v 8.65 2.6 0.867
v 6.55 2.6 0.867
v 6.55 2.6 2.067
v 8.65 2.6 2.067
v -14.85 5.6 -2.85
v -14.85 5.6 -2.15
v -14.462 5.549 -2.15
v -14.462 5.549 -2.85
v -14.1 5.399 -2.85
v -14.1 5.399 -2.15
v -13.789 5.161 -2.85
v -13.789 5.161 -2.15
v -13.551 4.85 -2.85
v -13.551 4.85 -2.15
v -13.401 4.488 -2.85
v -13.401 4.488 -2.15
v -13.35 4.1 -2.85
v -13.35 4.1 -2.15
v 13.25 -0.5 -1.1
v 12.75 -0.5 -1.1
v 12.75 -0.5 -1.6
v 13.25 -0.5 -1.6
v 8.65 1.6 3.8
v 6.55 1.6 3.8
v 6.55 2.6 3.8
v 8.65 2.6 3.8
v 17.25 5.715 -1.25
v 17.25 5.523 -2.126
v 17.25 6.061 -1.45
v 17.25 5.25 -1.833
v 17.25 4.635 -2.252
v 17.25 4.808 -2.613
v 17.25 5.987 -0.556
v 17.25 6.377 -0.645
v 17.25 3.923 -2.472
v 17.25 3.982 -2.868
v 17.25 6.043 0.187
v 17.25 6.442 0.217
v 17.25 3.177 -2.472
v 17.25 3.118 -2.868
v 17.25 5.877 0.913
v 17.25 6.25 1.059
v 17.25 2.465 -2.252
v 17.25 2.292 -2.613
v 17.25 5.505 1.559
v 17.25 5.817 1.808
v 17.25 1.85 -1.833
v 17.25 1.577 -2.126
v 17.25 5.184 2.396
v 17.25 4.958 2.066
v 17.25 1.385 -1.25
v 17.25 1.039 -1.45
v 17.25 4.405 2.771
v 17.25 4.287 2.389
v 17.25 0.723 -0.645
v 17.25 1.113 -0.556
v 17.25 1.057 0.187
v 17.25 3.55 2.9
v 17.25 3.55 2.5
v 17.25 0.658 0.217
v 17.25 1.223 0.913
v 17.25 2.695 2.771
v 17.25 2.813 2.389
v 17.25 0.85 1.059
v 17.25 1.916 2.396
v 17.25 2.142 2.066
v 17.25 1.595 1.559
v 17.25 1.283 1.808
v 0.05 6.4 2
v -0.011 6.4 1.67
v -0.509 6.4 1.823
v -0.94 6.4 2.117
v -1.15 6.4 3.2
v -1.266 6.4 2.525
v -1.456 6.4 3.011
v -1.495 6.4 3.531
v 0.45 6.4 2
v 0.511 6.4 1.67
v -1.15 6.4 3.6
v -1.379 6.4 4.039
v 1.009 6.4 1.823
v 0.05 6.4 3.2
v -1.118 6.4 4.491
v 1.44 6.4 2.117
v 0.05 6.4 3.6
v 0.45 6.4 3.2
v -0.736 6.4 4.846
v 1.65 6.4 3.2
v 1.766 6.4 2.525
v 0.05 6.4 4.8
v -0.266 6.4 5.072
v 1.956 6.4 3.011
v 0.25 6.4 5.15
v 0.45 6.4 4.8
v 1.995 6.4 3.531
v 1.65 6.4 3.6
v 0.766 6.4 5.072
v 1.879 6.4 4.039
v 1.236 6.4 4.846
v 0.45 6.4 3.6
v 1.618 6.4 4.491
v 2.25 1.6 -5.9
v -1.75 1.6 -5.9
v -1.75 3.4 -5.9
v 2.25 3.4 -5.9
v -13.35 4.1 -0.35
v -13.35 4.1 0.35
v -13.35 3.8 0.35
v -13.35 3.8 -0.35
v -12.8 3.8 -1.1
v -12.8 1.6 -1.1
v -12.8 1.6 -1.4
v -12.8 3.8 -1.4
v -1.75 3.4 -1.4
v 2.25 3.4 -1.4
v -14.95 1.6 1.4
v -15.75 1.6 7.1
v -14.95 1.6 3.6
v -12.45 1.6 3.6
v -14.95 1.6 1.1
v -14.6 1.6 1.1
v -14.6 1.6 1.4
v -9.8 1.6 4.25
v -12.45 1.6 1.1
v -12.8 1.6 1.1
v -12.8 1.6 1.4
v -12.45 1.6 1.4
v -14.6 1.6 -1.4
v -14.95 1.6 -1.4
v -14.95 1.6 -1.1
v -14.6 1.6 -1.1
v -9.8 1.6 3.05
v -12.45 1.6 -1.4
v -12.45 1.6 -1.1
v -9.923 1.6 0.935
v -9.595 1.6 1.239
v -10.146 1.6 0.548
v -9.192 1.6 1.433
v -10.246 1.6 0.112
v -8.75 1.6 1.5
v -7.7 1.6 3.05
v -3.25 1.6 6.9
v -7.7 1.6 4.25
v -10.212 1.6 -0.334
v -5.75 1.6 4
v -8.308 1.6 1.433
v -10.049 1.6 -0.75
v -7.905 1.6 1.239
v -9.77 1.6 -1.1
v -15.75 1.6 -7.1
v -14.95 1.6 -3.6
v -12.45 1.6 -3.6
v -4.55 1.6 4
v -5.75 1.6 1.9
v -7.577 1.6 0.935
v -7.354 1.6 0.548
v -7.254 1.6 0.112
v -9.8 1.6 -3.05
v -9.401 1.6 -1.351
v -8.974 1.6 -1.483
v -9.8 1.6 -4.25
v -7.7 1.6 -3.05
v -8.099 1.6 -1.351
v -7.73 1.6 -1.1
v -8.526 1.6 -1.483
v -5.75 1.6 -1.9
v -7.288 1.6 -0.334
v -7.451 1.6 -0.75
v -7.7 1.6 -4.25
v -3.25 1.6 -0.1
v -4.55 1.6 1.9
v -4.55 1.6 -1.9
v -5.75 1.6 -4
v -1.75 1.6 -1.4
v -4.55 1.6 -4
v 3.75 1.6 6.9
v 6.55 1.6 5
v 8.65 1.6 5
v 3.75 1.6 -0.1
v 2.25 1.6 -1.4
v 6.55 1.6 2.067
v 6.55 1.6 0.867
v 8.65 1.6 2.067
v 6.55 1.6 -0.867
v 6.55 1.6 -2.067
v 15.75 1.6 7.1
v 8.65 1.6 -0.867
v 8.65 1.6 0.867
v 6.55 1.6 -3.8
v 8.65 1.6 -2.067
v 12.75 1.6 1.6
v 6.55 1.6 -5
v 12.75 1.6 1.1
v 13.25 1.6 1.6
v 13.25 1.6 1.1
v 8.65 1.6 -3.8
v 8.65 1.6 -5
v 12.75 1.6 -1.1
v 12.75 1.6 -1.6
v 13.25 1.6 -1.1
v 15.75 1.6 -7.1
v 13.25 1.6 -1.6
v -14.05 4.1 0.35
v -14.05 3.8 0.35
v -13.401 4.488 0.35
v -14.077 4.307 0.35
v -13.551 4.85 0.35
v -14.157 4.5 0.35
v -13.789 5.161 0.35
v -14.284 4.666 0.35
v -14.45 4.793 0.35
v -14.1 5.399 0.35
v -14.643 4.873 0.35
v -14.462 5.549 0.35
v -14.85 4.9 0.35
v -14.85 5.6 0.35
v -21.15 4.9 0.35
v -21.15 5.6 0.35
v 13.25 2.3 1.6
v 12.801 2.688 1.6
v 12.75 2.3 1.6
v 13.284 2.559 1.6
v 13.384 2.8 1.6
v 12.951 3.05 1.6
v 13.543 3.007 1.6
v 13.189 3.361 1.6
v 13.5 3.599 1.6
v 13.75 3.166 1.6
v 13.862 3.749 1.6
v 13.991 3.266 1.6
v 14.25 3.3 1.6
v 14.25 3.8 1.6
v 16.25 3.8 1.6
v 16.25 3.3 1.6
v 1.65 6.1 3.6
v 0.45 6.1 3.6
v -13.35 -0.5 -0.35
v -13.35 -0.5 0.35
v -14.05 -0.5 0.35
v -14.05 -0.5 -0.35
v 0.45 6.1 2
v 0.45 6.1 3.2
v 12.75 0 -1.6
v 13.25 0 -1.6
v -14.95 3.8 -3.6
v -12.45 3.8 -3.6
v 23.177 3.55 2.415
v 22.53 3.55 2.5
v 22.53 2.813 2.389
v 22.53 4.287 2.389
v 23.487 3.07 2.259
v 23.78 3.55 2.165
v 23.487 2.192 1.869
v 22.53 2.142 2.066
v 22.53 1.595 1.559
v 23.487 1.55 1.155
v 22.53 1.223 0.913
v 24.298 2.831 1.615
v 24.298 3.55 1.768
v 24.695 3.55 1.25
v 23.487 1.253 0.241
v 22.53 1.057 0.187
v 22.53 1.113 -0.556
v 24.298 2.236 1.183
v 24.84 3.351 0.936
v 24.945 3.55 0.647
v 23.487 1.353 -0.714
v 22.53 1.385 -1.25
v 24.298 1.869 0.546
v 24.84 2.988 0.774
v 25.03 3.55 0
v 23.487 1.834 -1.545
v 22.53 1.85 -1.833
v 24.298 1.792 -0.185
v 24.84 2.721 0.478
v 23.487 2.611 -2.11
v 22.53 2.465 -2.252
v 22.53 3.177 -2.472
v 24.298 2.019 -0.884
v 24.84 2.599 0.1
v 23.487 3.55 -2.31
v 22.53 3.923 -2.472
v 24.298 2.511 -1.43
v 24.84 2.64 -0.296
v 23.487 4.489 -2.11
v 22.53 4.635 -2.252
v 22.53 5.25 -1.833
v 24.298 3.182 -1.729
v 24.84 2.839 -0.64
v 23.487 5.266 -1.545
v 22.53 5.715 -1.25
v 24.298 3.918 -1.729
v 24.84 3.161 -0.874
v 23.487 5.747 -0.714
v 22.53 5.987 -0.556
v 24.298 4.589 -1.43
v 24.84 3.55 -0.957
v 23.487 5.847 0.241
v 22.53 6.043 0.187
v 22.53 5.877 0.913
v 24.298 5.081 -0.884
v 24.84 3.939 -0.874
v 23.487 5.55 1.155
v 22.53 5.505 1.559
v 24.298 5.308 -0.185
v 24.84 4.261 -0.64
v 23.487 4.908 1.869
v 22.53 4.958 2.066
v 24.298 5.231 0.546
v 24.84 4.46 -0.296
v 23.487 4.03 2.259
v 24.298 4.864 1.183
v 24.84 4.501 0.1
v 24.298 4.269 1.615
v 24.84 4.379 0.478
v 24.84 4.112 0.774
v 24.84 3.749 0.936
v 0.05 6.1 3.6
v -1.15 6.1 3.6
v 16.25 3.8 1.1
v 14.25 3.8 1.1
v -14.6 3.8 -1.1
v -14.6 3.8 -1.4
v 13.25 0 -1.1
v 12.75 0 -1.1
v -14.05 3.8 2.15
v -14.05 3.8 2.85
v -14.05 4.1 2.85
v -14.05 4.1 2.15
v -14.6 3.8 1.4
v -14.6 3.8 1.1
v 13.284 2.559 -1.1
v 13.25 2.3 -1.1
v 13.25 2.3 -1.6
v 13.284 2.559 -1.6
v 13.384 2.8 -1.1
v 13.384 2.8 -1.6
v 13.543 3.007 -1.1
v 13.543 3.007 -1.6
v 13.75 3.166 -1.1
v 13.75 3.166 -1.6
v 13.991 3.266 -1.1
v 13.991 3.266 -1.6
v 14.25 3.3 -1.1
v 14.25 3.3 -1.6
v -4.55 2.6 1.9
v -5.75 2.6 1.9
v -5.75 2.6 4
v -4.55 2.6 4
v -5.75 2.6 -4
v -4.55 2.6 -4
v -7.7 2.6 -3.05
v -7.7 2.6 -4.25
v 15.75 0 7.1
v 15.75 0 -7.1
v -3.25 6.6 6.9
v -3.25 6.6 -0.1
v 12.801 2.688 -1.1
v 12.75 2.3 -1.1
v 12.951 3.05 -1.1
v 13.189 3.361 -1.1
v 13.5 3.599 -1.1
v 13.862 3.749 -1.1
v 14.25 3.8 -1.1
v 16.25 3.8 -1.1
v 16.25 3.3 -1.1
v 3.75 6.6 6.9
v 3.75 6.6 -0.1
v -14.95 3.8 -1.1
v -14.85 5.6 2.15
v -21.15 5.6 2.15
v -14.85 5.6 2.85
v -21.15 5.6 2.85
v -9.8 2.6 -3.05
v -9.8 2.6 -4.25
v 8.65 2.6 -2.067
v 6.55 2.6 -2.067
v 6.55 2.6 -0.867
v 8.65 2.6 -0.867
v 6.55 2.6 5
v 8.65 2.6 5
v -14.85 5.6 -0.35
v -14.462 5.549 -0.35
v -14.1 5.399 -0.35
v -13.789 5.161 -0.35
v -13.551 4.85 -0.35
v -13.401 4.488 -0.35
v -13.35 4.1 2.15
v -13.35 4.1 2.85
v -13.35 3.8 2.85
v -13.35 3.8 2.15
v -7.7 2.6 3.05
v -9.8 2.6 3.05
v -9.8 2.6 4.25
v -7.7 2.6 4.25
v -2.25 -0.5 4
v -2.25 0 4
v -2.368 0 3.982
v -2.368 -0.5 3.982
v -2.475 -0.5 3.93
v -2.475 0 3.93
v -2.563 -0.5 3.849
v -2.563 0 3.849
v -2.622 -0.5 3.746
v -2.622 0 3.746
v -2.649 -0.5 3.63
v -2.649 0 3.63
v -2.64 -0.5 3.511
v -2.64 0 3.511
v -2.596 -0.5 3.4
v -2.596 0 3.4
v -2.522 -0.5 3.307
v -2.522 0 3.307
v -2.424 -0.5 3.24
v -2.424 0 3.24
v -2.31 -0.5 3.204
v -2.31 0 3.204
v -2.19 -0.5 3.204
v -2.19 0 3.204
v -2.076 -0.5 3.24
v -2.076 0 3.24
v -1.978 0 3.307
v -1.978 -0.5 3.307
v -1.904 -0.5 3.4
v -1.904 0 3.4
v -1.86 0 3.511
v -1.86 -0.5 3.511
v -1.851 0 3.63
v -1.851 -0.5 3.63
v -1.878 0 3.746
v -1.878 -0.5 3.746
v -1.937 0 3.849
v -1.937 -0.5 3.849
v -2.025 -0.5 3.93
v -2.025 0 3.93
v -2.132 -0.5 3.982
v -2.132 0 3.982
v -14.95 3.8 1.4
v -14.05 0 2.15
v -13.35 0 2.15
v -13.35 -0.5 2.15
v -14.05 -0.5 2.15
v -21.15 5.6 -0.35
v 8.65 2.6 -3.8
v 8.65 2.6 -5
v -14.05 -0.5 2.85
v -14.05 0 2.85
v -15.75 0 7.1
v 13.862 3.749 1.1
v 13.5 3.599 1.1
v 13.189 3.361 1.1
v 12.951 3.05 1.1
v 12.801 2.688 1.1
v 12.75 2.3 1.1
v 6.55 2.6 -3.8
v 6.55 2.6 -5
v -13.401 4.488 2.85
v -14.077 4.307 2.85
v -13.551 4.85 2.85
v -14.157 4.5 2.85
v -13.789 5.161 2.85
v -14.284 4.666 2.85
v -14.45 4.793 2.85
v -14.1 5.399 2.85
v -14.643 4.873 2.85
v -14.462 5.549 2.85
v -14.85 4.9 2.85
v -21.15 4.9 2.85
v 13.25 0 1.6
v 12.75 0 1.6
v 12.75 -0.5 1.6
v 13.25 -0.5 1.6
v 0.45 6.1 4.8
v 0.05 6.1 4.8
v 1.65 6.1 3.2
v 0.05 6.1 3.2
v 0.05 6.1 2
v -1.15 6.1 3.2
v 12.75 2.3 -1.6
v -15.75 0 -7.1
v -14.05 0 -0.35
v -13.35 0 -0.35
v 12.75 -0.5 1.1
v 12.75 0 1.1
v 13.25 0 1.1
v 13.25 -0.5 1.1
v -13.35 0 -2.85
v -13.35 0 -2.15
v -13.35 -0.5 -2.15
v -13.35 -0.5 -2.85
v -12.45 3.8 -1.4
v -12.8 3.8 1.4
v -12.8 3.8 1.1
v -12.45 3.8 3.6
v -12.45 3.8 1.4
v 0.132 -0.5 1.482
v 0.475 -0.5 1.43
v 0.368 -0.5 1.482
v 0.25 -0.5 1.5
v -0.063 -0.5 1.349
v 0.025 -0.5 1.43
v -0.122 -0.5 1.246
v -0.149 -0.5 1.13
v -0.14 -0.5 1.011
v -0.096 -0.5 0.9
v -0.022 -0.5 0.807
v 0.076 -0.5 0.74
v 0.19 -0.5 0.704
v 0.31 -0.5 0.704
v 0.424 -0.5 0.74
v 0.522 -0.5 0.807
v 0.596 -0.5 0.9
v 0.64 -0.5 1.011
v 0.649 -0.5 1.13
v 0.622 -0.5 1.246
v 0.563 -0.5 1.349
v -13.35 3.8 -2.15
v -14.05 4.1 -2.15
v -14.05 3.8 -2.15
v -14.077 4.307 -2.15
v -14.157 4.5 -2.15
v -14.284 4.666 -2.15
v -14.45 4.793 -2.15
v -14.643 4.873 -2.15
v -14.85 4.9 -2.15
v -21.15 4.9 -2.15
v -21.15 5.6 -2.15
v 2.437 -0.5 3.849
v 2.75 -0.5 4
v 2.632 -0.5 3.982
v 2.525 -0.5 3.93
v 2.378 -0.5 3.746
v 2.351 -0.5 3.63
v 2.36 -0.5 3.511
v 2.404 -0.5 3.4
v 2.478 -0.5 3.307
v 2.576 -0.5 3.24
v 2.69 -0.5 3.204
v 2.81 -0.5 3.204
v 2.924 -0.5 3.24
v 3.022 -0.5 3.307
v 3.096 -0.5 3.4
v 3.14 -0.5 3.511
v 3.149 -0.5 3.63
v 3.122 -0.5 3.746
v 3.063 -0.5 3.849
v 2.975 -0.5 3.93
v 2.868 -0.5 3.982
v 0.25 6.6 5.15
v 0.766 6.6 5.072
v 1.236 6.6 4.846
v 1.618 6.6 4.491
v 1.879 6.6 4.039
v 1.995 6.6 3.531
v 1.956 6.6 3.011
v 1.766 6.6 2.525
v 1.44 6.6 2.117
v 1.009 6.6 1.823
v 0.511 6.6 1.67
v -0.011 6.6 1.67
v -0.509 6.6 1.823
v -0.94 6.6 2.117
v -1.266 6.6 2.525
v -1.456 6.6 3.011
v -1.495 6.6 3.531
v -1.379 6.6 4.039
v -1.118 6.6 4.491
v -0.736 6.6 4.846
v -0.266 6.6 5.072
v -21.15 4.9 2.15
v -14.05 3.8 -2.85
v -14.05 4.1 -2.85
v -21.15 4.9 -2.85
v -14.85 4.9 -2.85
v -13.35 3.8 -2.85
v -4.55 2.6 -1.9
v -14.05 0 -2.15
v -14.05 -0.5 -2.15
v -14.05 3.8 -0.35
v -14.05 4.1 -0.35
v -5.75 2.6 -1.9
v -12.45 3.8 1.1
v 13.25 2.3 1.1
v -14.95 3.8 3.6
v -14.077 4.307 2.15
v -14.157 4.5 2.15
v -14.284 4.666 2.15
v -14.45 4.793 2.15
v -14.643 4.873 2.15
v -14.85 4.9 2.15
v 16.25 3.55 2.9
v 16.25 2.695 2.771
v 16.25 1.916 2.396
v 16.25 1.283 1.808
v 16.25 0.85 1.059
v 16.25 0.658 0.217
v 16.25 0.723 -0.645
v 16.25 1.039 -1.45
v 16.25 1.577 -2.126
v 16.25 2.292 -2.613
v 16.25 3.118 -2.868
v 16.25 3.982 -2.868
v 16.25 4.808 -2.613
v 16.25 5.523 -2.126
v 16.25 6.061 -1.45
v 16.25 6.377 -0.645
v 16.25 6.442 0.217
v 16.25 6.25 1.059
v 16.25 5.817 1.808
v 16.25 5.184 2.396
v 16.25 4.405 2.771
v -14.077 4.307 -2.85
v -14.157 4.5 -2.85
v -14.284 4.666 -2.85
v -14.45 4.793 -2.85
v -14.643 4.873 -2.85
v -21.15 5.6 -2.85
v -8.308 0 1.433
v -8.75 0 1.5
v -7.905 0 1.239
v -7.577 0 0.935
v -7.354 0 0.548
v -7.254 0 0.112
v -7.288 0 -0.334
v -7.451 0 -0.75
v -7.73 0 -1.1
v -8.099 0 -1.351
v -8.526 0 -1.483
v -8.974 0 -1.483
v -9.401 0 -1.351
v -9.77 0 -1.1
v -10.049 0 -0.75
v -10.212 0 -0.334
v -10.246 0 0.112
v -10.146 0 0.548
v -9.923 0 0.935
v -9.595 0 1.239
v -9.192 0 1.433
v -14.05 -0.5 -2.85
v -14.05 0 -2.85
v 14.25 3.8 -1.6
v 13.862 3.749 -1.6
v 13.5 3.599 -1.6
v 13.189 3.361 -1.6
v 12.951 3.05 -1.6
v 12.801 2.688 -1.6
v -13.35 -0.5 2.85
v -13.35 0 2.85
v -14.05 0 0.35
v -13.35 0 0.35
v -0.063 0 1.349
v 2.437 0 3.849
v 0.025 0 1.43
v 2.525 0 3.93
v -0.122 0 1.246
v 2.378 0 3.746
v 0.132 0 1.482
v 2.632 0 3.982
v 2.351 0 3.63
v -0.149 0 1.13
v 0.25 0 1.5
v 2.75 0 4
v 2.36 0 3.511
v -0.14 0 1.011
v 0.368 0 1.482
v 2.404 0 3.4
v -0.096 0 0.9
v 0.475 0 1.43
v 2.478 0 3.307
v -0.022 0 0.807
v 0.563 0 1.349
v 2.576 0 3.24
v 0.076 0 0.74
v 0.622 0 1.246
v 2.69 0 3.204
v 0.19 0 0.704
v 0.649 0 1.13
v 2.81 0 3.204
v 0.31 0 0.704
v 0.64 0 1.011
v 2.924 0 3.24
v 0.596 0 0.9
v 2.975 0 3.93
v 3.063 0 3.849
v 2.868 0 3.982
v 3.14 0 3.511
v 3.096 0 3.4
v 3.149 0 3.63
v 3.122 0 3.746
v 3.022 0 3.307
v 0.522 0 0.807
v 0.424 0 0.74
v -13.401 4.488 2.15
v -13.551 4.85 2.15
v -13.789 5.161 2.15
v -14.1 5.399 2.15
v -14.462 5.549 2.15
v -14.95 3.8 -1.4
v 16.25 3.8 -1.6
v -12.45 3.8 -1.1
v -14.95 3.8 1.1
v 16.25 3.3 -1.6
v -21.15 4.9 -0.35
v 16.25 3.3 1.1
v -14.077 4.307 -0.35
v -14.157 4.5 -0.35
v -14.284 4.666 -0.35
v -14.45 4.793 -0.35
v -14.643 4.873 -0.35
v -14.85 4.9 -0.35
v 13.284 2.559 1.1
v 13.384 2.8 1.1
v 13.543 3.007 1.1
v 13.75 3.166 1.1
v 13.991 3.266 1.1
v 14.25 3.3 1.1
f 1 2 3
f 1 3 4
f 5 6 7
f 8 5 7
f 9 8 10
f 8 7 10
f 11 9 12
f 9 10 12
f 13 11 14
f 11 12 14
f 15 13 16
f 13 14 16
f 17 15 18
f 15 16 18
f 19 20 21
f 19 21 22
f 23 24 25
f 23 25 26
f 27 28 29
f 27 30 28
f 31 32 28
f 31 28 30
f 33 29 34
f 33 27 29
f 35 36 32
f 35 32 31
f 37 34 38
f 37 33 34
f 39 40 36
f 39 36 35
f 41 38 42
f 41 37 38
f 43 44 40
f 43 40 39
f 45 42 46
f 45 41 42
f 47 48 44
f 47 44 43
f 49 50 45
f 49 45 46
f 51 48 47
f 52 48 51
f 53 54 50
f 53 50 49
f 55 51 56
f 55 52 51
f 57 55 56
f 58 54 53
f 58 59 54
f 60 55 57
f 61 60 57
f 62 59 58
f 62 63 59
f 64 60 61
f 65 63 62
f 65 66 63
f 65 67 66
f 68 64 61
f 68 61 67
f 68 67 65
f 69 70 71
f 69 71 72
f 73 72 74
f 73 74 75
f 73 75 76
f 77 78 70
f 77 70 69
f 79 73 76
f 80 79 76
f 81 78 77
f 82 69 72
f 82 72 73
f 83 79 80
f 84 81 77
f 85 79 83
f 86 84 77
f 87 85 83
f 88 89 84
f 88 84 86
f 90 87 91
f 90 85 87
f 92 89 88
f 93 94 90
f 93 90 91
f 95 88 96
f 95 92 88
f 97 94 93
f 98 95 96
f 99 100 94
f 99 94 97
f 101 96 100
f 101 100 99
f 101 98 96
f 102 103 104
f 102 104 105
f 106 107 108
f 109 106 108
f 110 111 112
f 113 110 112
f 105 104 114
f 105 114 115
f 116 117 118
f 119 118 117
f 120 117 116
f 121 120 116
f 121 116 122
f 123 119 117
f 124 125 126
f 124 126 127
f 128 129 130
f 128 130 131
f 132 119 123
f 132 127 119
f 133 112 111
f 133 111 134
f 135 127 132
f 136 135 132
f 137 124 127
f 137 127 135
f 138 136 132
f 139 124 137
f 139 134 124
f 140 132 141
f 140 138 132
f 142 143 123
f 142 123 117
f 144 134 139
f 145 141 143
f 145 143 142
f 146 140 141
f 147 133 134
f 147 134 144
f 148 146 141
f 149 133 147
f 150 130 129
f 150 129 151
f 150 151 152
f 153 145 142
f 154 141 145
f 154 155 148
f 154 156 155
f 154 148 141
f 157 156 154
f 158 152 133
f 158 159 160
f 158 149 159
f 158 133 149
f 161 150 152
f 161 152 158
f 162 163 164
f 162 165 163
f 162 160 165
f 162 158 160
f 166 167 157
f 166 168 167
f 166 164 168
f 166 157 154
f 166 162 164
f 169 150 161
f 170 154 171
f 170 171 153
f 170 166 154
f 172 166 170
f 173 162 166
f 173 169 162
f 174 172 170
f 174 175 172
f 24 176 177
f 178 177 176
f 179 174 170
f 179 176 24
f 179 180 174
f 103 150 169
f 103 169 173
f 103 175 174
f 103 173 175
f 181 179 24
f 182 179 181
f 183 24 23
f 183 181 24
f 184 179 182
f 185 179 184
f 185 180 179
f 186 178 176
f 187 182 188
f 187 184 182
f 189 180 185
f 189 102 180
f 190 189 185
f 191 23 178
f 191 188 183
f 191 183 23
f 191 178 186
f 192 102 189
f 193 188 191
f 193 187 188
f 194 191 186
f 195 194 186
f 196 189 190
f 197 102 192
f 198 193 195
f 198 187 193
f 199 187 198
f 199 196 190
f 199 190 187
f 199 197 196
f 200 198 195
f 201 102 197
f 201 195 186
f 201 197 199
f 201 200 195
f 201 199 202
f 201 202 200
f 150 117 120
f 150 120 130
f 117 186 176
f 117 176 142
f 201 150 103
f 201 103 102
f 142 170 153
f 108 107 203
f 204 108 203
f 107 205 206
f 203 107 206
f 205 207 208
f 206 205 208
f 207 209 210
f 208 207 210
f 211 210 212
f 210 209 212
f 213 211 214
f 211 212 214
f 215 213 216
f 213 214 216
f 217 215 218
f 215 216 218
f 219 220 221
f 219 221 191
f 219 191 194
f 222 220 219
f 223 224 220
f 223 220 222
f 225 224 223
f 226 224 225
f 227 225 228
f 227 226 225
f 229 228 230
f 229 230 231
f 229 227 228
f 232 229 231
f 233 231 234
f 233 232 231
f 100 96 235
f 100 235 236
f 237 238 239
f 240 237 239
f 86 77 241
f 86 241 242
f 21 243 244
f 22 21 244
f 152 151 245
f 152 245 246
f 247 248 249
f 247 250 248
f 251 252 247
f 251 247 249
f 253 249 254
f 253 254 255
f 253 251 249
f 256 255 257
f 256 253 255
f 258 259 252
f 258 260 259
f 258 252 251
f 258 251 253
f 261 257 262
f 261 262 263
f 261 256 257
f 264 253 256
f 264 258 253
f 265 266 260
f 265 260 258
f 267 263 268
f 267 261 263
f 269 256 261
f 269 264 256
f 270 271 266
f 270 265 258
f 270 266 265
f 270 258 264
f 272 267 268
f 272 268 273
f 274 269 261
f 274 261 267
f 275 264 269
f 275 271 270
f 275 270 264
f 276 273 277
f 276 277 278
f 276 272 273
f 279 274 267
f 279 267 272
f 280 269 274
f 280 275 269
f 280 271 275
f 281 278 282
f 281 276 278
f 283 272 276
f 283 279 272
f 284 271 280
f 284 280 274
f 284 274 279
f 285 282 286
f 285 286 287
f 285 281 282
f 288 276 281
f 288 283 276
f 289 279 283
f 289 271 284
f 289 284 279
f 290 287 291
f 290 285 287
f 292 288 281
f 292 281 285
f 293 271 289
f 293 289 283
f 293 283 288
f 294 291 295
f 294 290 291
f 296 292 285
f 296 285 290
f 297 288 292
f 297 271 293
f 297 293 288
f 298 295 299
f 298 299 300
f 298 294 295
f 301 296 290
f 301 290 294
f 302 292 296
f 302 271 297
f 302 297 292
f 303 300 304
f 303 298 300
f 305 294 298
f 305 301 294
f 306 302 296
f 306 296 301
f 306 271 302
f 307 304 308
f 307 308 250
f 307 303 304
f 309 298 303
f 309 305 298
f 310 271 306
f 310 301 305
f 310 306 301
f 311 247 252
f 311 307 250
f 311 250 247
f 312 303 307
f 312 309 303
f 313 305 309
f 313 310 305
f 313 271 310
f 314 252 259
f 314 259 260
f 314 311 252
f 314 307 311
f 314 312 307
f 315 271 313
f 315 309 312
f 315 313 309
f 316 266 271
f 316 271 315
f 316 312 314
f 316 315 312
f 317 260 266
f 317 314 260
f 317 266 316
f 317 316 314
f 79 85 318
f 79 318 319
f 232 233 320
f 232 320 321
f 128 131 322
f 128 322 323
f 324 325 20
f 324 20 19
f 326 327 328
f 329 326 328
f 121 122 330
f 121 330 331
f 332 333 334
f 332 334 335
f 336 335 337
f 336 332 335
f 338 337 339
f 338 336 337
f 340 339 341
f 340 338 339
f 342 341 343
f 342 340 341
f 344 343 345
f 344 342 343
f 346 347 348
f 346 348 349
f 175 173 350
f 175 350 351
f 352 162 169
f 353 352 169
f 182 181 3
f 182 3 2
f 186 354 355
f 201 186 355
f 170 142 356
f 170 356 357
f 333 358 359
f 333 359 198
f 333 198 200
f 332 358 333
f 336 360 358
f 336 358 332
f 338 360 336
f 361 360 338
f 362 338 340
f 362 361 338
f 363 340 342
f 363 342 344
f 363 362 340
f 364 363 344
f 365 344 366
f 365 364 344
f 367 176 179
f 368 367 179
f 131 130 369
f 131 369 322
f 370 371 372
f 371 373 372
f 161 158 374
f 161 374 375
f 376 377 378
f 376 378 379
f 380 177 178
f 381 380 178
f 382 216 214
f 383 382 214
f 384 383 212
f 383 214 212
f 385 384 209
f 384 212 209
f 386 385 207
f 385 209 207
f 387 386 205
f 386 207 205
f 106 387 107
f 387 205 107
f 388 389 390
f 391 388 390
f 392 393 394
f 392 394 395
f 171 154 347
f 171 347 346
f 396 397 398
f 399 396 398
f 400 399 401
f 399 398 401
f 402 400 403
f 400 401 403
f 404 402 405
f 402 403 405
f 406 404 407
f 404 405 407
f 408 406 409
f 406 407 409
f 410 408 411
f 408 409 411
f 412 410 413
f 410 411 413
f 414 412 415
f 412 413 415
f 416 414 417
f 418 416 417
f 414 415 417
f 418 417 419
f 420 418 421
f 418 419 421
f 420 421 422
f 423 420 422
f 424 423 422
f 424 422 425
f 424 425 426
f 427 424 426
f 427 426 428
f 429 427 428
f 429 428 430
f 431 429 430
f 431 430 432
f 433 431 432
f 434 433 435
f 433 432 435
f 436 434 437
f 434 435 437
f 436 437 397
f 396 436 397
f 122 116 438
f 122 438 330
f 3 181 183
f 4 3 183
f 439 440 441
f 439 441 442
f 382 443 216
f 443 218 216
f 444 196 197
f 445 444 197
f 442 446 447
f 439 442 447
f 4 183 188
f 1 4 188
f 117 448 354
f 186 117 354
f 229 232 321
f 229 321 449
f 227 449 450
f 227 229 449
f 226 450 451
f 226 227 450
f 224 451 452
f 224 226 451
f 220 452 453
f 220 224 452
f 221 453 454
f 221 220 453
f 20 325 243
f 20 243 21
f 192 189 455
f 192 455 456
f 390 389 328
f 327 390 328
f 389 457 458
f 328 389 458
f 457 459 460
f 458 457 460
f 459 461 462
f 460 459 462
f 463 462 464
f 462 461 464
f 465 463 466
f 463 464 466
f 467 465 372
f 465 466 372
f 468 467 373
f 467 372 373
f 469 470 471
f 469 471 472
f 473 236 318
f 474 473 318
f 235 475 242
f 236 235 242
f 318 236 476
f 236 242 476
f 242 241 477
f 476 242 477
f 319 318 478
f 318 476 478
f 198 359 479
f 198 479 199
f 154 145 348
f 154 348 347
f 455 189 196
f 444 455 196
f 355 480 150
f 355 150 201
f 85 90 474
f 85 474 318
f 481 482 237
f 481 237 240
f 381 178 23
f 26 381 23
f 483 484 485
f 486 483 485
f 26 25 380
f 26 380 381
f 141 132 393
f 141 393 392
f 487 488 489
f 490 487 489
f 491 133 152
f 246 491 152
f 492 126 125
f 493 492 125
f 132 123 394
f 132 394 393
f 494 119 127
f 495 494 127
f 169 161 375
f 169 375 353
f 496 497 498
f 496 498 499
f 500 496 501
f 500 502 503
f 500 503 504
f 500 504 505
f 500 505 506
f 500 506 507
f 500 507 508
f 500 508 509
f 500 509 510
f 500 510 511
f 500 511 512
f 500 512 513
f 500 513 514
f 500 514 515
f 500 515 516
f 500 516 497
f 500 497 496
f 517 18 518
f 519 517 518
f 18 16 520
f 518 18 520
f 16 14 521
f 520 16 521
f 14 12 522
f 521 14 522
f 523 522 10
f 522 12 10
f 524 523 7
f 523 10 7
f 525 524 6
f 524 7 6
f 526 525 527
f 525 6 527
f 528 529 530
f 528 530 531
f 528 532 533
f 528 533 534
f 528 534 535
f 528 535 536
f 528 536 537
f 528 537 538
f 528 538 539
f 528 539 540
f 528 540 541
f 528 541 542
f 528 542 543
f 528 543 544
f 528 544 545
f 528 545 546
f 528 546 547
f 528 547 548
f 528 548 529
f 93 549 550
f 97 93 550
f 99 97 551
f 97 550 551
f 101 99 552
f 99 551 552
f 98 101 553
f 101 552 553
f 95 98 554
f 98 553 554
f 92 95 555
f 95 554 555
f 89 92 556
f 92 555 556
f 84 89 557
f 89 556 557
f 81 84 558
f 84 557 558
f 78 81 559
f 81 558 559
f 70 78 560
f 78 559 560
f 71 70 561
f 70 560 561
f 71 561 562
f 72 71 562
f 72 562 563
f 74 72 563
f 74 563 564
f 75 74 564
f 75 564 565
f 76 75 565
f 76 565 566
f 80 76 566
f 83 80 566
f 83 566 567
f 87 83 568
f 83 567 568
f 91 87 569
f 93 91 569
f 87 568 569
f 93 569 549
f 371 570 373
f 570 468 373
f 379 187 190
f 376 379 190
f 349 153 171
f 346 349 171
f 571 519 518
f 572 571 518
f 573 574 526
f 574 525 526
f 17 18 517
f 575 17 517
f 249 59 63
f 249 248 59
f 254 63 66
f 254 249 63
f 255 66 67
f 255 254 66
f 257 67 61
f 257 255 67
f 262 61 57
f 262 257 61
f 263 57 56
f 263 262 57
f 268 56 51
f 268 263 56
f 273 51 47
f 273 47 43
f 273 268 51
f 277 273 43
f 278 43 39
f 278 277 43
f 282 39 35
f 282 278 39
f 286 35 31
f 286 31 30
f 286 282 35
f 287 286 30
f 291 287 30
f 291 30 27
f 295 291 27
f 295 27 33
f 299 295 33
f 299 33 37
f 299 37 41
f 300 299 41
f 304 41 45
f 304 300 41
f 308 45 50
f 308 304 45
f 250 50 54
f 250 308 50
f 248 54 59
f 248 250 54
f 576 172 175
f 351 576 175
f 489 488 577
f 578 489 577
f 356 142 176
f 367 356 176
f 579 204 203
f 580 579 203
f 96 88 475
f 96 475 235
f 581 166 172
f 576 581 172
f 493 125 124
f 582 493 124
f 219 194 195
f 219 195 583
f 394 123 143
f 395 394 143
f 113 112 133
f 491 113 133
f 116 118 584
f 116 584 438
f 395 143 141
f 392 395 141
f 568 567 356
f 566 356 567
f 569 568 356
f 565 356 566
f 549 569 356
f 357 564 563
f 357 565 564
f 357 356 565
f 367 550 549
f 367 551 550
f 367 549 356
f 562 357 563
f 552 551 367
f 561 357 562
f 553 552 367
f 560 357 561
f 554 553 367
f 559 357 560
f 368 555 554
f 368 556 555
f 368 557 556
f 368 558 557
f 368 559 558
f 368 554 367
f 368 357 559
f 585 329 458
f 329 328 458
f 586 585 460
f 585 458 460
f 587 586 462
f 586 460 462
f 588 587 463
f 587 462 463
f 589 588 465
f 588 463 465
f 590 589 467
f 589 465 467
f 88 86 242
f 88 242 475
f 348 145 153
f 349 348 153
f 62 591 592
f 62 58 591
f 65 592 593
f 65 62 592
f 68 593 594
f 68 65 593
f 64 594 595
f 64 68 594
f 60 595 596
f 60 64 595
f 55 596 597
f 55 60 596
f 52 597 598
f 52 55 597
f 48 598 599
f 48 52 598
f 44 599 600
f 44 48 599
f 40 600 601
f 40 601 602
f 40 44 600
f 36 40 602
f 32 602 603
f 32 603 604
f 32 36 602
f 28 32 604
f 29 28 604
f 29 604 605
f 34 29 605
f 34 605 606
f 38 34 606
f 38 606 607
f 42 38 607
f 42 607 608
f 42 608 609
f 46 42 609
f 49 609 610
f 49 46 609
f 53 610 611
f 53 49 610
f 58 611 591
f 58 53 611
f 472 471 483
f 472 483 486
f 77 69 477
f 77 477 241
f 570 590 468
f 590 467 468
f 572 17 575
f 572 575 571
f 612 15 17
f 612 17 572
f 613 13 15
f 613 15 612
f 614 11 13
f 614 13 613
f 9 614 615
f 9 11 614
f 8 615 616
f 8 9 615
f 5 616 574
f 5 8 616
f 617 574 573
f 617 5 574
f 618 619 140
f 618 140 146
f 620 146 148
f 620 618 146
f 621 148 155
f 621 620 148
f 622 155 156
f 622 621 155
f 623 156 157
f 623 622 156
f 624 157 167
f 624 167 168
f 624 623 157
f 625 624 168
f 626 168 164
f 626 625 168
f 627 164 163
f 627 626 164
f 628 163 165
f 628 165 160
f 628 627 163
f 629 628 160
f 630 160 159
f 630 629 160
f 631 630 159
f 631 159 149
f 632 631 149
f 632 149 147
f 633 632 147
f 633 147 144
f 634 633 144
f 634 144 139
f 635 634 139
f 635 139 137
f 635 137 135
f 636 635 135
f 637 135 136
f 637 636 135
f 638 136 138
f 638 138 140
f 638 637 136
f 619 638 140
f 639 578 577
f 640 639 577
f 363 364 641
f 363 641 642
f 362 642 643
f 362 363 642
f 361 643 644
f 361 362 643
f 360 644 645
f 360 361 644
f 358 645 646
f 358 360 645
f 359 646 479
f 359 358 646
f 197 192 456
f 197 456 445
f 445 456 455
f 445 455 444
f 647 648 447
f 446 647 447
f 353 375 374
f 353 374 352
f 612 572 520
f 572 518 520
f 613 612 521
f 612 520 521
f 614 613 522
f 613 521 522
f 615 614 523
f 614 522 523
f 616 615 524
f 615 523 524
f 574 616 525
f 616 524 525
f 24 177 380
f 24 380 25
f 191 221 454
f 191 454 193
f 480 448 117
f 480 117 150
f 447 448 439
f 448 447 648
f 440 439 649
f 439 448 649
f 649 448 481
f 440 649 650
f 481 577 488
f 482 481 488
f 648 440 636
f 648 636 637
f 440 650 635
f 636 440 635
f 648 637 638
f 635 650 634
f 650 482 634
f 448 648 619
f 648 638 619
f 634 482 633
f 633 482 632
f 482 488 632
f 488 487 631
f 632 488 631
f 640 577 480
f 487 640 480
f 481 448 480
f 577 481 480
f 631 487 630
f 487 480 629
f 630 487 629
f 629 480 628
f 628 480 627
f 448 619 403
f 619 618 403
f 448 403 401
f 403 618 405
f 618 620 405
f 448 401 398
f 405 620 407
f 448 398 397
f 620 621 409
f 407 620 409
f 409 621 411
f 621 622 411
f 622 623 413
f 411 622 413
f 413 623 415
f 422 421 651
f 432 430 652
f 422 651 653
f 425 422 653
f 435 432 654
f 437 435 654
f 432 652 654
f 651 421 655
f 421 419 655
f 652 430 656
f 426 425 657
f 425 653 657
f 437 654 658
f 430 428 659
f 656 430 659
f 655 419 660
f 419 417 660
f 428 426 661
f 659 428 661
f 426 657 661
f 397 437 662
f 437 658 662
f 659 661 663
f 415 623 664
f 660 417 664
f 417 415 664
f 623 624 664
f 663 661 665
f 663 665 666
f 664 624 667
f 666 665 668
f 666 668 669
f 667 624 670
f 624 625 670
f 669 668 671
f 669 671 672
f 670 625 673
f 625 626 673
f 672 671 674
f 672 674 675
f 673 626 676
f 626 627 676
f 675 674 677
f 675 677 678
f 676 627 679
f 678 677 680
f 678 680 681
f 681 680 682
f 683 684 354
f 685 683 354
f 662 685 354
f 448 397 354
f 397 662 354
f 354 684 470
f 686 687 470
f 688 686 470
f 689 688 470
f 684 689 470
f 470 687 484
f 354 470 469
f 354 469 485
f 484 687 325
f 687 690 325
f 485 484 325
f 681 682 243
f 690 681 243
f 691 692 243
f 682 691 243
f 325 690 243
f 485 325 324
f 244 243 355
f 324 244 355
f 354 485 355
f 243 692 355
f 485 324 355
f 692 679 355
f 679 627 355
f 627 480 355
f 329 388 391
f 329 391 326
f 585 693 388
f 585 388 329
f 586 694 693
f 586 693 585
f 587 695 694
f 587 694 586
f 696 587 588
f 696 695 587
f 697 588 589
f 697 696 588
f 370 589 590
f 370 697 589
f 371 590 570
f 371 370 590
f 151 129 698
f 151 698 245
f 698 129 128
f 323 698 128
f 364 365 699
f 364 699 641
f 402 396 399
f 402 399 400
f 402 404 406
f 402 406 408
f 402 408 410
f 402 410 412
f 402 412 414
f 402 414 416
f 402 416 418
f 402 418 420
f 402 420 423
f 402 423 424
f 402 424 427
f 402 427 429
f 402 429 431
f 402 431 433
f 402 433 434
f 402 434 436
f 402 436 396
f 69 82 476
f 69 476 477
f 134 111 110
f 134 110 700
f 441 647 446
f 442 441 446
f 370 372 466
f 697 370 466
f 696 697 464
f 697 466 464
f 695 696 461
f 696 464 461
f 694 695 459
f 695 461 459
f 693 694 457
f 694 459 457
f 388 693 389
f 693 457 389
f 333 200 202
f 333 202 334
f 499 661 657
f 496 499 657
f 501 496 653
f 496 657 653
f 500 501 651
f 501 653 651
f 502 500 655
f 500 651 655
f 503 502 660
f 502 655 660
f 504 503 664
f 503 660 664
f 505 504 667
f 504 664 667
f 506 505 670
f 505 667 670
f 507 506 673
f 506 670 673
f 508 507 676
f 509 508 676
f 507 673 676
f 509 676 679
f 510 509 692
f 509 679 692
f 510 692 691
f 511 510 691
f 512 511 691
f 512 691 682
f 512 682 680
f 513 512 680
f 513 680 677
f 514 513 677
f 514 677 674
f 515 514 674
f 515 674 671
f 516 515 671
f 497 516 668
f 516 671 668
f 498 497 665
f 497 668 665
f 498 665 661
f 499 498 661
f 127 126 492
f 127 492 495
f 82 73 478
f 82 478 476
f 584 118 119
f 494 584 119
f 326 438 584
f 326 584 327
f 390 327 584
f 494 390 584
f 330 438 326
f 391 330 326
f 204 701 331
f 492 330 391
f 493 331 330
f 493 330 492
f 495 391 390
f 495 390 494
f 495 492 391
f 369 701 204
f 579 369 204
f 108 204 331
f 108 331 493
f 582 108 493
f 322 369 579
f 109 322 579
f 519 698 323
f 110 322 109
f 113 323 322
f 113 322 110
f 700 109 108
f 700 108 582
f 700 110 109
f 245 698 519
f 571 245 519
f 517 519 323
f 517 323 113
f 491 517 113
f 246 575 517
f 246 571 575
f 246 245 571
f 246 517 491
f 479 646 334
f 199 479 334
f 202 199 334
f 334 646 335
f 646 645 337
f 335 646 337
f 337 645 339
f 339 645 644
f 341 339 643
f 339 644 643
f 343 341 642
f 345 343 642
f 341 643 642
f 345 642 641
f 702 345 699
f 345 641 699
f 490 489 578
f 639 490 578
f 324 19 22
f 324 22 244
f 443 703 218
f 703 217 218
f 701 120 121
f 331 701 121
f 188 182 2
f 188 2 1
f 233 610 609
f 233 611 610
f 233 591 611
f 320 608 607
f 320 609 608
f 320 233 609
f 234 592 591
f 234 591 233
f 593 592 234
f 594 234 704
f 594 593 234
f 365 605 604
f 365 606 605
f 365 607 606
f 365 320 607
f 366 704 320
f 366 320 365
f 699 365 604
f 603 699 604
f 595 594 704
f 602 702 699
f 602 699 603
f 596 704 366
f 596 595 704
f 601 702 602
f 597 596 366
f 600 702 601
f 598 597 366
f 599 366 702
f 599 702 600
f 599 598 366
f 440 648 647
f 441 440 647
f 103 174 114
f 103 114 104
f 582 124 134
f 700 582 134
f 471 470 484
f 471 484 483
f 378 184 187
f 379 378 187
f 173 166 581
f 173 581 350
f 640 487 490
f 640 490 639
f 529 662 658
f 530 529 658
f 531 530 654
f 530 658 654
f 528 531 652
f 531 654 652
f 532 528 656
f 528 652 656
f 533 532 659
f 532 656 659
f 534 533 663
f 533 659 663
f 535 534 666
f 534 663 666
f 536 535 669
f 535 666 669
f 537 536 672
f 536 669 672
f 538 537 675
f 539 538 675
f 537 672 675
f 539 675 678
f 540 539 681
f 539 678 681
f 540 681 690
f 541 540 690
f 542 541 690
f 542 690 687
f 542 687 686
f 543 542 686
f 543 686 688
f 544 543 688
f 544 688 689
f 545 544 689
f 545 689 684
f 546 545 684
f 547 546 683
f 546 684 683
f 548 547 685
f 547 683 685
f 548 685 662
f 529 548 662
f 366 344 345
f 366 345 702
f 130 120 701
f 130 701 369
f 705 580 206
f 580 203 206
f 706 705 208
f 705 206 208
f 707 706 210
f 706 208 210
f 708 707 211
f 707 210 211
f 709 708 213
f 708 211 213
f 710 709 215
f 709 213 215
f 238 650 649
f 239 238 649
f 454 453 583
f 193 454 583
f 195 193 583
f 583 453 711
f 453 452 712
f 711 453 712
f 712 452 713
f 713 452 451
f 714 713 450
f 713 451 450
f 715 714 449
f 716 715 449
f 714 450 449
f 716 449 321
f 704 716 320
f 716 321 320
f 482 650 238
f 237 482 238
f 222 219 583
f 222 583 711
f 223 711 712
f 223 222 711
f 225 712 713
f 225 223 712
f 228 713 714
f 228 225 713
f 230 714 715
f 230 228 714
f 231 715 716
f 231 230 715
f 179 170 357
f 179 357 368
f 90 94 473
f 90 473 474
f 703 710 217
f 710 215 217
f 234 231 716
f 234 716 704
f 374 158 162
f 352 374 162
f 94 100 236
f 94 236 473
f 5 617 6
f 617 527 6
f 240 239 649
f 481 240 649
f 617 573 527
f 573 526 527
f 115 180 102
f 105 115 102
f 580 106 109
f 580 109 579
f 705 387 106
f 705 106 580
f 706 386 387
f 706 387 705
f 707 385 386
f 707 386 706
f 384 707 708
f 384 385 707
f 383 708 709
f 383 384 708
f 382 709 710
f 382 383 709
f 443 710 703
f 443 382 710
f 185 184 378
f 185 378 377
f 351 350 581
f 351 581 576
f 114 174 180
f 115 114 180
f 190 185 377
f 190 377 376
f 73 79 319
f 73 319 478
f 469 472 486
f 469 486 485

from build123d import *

# Parameters (mm, degrees)
SKETCH_1_W             = 31.5
SKETCH_1_H             = 14.2
SKETCH_1_R             = 1.5
EXTRUDE_1_DEPTH        = 1.6
SKETCH_2_W             = 7
SKETCH_2_H             = 7
EXTRUDE_2_DEPTH        = 5
SKETCH_3_R             = 1.75
CUT_EXTRUDE_1_DEPTH    = 0.2
CUT_EXTRUDE_2_DEPTH    = 0.3
SKETCH_6_W             = 4
SKETCH_6_H             = 4.5
EXTRUDE_3_DEPTH        = 1.8
SKETCH_7_W             = 2.1
SKETCH_7_H             = 1.2
SKETCH_7_W_2           = 1.2
SKETCH_7_H_2           = 2.1
EXTRUDE_4_DEPTH        = 1
EXTRUDE_START          = 1.6
EXTRUDE_5_DEPTH        = 0.5
PATTERN_LINEAR_1_COUNT = 2
PATTERN_LINEAR_1_PITCH = 2.7
EXTRUDE_6_DEPTH        = 0.35
PATTERN_LINEAR_2_COUNT = 2
PATTERN_LINEAR_2_PITCH = 2.5
PATTERN_LINEAR_3_COUNT = 2
PATTERN_LINEAR_3_PITCH = 2.5
SKETCH_12_W            = 2.5
SKETCH_12_H            = 2.2
SKETCH_12_W_2          = 1.8
SKETCH_12_H_2          = 0.3
EXTRUDE_7_DEPTH        = 2.2
SKETCH_13_R            = 0.4
EXTRUDE_8_DEPTH        = 0.5


with BuildPart() as part:
    # Эскиз1 → Бобышка-Вытянуть1 (new body)
    with BuildSketch(Plane(origin=(0, 0, 0), x_dir=(1, 0, 0), z_dir=(0, 1, 0))):
        Rectangle(SKETCH_1_W, SKETCH_1_H)
        with Locations(Location((-8.75, 0, 0), (0, 0, 270))):
            Circle(SKETCH_1_R, mode=Mode.SUBTRACT)
    extrude(amount=EXTRUDE_1_DEPTH)

    # Эскиз2 → Бобышка-Вытянуть2 (add)
    with BuildSketch(Plane(origin=(0, 1.6, 0), x_dir=(1, 0, 0), z_dir=(0, 1, 0))):
        with Locations((0.25, -3.4)):
            Rectangle(SKETCH_2_W, SKETCH_2_H)
    extrude(amount=EXTRUDE_2_DEPTH)

    # Эскиз3 → Вырез-Вытянуть1 (cut)
    with BuildSketch(Plane(origin=(0, 6.6, 0), x_dir=(1, 0, 0), z_dir=(0, 1, 0))):
        with Locations(Location((0.25, -3.4, 0), (0, 0, 270))):
            Circle(SKETCH_3_R)
    extrude(amount=-CUT_EXTRUDE_1_DEPTH, mode=Mode.SUBTRACT)

    # Эскиз4 → Вырез-Вытянуть2 (cut)
    with BuildSketch(Plane(origin=(0, 6.4, 0), x_dir=(1, 0, 0), z_dir=(0, 1, 0))):
        Polygon((0.05, -2), (0.45, -2), (0.45, -3.2), (1.65, -3.2), (1.65, -3.6), (0.45, -3.6), (0.45, -4.8), (0.05, -4.8), (0.05, -3.6), (-1.15, -3.6), (-1.15, -3.2), (0.05, -3.2), align=None)
    extrude(amount=-CUT_EXTRUDE_2_DEPTH, mode=Mode.SUBTRACT)

    # Эскиз6 → Бобышка-Вытянуть3 (add)
    with BuildSketch(Plane(origin=(0, 1.6, 0), x_dir=(1, 0, 0), z_dir=(0, 1, 0))):
        with Locations((0.25, 3.65)):
            Rectangle(SKETCH_6_W, SKETCH_6_H)
    extrude(amount=EXTRUDE_3_DEPTH)

    # Эскиз7 → Бобышка-Вытянуть4 (add)
    with BuildSketch(Plane(origin=(0, 1.6, 0), x_dir=(1, 0, 0), z_dir=(0, 1, 0))):
        with Locations((7.6, 1.466666667)):
            Rectangle(SKETCH_7_W, SKETCH_7_H)
        with Locations((7.6, 4.4)):
            Rectangle(SKETCH_7_W, SKETCH_7_H)
        with Locations((-8.75, 3.65)):
            Rectangle(SKETCH_7_W, SKETCH_7_H)
        with Locations((-5.15, 2.95)):
            Rectangle(SKETCH_7_W_2, SKETCH_7_H_2)
        with Locations((-5.15, -2.95)):
            Rectangle(SKETCH_7_W_2, SKETCH_7_H_2)
        with Locations((-8.75, -3.65)):
            Rectangle(SKETCH_7_W, SKETCH_7_H)
        with Locations((7.6, -4.4)):
            Rectangle(SKETCH_7_W, SKETCH_7_H)
        with Locations((7.6, -1.466666667)):
            Rectangle(SKETCH_7_W, SKETCH_7_H)
    extrude(amount=EXTRUDE_4_DEPTH)

    # Эскиз9 → Бобышка-Вытянуть5 (add)
    with BuildSketch(Plane.XY.offset(EXTRUDE_START)):
        with BuildLine():
            Line((12.75, 2.3), (12.75, -0.5))
            Line((12.75, -0.5), (13.25, -0.5))
            Line((13.25, -0.5), (13.25, 2.3))
            ThreePointArc((13.25, 2.3), (13.542893219, 3.007106781), (14.25, 3.3))
            Line((14.25, 3.3), (16.25, 3.3))
            Line((16.25, 3.3), (16.25, 3.8))
            Line((16.25, 3.8), (14.25, 3.8))
            ThreePointArc((14.25, 3.8), (13.189339828, 3.360660172), (12.75, 2.3))
        make_face()
    extrude_5 = extrude(amount=-EXTRUDE_5_DEPTH)

    # Линейный массив1: Бобышка-Вытянуть5 ×2
    with Locations(*[(0, 0, -i * PATTERN_LINEAR_1_PITCH) for i in range(1, PATTERN_LINEAR_1_COUNT)]):
        add(extrude_5)

    # Эскиз10 → Повернуть1 (revolve)
    with BuildSketch(Plane.XY, mode=Mode.PRIVATE) as revolve_1_sk:
        with BuildLine():
            Line((16.25, 3.55), (16.25, 6.45))
            Line((16.25, 6.45), (17.25, 6.45))
            Line((17.25, 6.45), (17.25, 6.05))
            Line((17.25, 6.05), (22.53, 6.05))
            ThreePointArc((22.53, 6.05), (24.297766953, 5.317766953), (25.03, 3.55))
            Line((25.03, 3.55), (16.25, 3.55))
        make_face()
    revolve(revolve_1_sk.sketch.rotate(Axis((16.25, 3.55, 0), (1, 0, 0)), 90), axis=Axis((16.25, 3.55, 0), (1, 0, 0)))

    # Эскиз11 → Бобышка-Вытянуть6 (add, symmetric)
    with BuildSketch(Plane.XY):
        with BuildLine():
            Line((-13.35, -0.5), (-14.05, -0.5))
            Line((-14.05, -0.5), (-14.05, 4.1))
            ThreePointArc((-14.05, 4.1), (-14.284314575, 4.665685425), (-14.85, 4.9))
            Line((-14.85, 4.9), (-21.15, 4.9))
            Line((-21.15, 4.9), (-21.15, 5.6))
            Line((-21.15, 5.6), (-14.85, 5.6))
            ThreePointArc((-14.85, 5.6), (-13.789339828, 5.160660172), (-13.35, 4.1))
            Line((-13.35, 4.1), (-13.35, -0.5))
        make_face()
    extrude_6 = extrude(amount=EXTRUDE_6_DEPTH, both=True)

    # Линейный массив2: Бобышка-Вытянуть6 ×2
    with Locations(*[(0, 0, i * PATTERN_LINEAR_2_PITCH) for i in range(1, PATTERN_LINEAR_2_COUNT)]):
        add(extrude_6)

    # Линейный массив3: Бобышка-Вытянуть6 ×2
    with Locations(*[(0, 0, -i * PATTERN_LINEAR_3_PITCH) for i in range(1, PATTERN_LINEAR_3_COUNT)]):
        add(extrude_6)

    # Эскиз12 → Бобышка-Вытянуть7 (add)
    with BuildSketch(Plane(origin=(0, 1.6, 0), x_dir=(1, 0, 0), z_dir=(0, 1, 0))):
        with Locations((-13.7, 2.5)):
            Rectangle(SKETCH_12_W, SKETCH_12_H)
        with Locations((-13.7, 1.25)):
            Rectangle(SKETCH_12_W_2, SKETCH_12_H_2)
        with Locations((-13.7, 0)):
            Rectangle(SKETCH_12_W, SKETCH_12_H)
        with Locations((-13.7, -1.25)):
            Rectangle(SKETCH_12_W_2, SKETCH_12_H_2)
        with Locations((-13.7, -2.5)):
            Rectangle(SKETCH_12_W, SKETCH_12_H)
    extrude(amount=EXTRUDE_7_DEPTH)

    # Эскиз13 → Бобышка-Вытянуть8 (add)
    with BuildSketch(Plane.XZ):
        with Locations(Location((-2.25, 3.6, 0), (0, 0, 90))):
            Circle(SKETCH_13_R)
        with Locations(Location((0.25, 1.1, 0), (0, 0, 90))):
            Circle(SKETCH_13_R)
        with Locations(Location((2.75, 3.6, 0), (0, 0, 90))):
            Circle(SKETCH_13_R)
    extrude(amount=EXTRUDE_8_DEPTH)


solid = part.part
